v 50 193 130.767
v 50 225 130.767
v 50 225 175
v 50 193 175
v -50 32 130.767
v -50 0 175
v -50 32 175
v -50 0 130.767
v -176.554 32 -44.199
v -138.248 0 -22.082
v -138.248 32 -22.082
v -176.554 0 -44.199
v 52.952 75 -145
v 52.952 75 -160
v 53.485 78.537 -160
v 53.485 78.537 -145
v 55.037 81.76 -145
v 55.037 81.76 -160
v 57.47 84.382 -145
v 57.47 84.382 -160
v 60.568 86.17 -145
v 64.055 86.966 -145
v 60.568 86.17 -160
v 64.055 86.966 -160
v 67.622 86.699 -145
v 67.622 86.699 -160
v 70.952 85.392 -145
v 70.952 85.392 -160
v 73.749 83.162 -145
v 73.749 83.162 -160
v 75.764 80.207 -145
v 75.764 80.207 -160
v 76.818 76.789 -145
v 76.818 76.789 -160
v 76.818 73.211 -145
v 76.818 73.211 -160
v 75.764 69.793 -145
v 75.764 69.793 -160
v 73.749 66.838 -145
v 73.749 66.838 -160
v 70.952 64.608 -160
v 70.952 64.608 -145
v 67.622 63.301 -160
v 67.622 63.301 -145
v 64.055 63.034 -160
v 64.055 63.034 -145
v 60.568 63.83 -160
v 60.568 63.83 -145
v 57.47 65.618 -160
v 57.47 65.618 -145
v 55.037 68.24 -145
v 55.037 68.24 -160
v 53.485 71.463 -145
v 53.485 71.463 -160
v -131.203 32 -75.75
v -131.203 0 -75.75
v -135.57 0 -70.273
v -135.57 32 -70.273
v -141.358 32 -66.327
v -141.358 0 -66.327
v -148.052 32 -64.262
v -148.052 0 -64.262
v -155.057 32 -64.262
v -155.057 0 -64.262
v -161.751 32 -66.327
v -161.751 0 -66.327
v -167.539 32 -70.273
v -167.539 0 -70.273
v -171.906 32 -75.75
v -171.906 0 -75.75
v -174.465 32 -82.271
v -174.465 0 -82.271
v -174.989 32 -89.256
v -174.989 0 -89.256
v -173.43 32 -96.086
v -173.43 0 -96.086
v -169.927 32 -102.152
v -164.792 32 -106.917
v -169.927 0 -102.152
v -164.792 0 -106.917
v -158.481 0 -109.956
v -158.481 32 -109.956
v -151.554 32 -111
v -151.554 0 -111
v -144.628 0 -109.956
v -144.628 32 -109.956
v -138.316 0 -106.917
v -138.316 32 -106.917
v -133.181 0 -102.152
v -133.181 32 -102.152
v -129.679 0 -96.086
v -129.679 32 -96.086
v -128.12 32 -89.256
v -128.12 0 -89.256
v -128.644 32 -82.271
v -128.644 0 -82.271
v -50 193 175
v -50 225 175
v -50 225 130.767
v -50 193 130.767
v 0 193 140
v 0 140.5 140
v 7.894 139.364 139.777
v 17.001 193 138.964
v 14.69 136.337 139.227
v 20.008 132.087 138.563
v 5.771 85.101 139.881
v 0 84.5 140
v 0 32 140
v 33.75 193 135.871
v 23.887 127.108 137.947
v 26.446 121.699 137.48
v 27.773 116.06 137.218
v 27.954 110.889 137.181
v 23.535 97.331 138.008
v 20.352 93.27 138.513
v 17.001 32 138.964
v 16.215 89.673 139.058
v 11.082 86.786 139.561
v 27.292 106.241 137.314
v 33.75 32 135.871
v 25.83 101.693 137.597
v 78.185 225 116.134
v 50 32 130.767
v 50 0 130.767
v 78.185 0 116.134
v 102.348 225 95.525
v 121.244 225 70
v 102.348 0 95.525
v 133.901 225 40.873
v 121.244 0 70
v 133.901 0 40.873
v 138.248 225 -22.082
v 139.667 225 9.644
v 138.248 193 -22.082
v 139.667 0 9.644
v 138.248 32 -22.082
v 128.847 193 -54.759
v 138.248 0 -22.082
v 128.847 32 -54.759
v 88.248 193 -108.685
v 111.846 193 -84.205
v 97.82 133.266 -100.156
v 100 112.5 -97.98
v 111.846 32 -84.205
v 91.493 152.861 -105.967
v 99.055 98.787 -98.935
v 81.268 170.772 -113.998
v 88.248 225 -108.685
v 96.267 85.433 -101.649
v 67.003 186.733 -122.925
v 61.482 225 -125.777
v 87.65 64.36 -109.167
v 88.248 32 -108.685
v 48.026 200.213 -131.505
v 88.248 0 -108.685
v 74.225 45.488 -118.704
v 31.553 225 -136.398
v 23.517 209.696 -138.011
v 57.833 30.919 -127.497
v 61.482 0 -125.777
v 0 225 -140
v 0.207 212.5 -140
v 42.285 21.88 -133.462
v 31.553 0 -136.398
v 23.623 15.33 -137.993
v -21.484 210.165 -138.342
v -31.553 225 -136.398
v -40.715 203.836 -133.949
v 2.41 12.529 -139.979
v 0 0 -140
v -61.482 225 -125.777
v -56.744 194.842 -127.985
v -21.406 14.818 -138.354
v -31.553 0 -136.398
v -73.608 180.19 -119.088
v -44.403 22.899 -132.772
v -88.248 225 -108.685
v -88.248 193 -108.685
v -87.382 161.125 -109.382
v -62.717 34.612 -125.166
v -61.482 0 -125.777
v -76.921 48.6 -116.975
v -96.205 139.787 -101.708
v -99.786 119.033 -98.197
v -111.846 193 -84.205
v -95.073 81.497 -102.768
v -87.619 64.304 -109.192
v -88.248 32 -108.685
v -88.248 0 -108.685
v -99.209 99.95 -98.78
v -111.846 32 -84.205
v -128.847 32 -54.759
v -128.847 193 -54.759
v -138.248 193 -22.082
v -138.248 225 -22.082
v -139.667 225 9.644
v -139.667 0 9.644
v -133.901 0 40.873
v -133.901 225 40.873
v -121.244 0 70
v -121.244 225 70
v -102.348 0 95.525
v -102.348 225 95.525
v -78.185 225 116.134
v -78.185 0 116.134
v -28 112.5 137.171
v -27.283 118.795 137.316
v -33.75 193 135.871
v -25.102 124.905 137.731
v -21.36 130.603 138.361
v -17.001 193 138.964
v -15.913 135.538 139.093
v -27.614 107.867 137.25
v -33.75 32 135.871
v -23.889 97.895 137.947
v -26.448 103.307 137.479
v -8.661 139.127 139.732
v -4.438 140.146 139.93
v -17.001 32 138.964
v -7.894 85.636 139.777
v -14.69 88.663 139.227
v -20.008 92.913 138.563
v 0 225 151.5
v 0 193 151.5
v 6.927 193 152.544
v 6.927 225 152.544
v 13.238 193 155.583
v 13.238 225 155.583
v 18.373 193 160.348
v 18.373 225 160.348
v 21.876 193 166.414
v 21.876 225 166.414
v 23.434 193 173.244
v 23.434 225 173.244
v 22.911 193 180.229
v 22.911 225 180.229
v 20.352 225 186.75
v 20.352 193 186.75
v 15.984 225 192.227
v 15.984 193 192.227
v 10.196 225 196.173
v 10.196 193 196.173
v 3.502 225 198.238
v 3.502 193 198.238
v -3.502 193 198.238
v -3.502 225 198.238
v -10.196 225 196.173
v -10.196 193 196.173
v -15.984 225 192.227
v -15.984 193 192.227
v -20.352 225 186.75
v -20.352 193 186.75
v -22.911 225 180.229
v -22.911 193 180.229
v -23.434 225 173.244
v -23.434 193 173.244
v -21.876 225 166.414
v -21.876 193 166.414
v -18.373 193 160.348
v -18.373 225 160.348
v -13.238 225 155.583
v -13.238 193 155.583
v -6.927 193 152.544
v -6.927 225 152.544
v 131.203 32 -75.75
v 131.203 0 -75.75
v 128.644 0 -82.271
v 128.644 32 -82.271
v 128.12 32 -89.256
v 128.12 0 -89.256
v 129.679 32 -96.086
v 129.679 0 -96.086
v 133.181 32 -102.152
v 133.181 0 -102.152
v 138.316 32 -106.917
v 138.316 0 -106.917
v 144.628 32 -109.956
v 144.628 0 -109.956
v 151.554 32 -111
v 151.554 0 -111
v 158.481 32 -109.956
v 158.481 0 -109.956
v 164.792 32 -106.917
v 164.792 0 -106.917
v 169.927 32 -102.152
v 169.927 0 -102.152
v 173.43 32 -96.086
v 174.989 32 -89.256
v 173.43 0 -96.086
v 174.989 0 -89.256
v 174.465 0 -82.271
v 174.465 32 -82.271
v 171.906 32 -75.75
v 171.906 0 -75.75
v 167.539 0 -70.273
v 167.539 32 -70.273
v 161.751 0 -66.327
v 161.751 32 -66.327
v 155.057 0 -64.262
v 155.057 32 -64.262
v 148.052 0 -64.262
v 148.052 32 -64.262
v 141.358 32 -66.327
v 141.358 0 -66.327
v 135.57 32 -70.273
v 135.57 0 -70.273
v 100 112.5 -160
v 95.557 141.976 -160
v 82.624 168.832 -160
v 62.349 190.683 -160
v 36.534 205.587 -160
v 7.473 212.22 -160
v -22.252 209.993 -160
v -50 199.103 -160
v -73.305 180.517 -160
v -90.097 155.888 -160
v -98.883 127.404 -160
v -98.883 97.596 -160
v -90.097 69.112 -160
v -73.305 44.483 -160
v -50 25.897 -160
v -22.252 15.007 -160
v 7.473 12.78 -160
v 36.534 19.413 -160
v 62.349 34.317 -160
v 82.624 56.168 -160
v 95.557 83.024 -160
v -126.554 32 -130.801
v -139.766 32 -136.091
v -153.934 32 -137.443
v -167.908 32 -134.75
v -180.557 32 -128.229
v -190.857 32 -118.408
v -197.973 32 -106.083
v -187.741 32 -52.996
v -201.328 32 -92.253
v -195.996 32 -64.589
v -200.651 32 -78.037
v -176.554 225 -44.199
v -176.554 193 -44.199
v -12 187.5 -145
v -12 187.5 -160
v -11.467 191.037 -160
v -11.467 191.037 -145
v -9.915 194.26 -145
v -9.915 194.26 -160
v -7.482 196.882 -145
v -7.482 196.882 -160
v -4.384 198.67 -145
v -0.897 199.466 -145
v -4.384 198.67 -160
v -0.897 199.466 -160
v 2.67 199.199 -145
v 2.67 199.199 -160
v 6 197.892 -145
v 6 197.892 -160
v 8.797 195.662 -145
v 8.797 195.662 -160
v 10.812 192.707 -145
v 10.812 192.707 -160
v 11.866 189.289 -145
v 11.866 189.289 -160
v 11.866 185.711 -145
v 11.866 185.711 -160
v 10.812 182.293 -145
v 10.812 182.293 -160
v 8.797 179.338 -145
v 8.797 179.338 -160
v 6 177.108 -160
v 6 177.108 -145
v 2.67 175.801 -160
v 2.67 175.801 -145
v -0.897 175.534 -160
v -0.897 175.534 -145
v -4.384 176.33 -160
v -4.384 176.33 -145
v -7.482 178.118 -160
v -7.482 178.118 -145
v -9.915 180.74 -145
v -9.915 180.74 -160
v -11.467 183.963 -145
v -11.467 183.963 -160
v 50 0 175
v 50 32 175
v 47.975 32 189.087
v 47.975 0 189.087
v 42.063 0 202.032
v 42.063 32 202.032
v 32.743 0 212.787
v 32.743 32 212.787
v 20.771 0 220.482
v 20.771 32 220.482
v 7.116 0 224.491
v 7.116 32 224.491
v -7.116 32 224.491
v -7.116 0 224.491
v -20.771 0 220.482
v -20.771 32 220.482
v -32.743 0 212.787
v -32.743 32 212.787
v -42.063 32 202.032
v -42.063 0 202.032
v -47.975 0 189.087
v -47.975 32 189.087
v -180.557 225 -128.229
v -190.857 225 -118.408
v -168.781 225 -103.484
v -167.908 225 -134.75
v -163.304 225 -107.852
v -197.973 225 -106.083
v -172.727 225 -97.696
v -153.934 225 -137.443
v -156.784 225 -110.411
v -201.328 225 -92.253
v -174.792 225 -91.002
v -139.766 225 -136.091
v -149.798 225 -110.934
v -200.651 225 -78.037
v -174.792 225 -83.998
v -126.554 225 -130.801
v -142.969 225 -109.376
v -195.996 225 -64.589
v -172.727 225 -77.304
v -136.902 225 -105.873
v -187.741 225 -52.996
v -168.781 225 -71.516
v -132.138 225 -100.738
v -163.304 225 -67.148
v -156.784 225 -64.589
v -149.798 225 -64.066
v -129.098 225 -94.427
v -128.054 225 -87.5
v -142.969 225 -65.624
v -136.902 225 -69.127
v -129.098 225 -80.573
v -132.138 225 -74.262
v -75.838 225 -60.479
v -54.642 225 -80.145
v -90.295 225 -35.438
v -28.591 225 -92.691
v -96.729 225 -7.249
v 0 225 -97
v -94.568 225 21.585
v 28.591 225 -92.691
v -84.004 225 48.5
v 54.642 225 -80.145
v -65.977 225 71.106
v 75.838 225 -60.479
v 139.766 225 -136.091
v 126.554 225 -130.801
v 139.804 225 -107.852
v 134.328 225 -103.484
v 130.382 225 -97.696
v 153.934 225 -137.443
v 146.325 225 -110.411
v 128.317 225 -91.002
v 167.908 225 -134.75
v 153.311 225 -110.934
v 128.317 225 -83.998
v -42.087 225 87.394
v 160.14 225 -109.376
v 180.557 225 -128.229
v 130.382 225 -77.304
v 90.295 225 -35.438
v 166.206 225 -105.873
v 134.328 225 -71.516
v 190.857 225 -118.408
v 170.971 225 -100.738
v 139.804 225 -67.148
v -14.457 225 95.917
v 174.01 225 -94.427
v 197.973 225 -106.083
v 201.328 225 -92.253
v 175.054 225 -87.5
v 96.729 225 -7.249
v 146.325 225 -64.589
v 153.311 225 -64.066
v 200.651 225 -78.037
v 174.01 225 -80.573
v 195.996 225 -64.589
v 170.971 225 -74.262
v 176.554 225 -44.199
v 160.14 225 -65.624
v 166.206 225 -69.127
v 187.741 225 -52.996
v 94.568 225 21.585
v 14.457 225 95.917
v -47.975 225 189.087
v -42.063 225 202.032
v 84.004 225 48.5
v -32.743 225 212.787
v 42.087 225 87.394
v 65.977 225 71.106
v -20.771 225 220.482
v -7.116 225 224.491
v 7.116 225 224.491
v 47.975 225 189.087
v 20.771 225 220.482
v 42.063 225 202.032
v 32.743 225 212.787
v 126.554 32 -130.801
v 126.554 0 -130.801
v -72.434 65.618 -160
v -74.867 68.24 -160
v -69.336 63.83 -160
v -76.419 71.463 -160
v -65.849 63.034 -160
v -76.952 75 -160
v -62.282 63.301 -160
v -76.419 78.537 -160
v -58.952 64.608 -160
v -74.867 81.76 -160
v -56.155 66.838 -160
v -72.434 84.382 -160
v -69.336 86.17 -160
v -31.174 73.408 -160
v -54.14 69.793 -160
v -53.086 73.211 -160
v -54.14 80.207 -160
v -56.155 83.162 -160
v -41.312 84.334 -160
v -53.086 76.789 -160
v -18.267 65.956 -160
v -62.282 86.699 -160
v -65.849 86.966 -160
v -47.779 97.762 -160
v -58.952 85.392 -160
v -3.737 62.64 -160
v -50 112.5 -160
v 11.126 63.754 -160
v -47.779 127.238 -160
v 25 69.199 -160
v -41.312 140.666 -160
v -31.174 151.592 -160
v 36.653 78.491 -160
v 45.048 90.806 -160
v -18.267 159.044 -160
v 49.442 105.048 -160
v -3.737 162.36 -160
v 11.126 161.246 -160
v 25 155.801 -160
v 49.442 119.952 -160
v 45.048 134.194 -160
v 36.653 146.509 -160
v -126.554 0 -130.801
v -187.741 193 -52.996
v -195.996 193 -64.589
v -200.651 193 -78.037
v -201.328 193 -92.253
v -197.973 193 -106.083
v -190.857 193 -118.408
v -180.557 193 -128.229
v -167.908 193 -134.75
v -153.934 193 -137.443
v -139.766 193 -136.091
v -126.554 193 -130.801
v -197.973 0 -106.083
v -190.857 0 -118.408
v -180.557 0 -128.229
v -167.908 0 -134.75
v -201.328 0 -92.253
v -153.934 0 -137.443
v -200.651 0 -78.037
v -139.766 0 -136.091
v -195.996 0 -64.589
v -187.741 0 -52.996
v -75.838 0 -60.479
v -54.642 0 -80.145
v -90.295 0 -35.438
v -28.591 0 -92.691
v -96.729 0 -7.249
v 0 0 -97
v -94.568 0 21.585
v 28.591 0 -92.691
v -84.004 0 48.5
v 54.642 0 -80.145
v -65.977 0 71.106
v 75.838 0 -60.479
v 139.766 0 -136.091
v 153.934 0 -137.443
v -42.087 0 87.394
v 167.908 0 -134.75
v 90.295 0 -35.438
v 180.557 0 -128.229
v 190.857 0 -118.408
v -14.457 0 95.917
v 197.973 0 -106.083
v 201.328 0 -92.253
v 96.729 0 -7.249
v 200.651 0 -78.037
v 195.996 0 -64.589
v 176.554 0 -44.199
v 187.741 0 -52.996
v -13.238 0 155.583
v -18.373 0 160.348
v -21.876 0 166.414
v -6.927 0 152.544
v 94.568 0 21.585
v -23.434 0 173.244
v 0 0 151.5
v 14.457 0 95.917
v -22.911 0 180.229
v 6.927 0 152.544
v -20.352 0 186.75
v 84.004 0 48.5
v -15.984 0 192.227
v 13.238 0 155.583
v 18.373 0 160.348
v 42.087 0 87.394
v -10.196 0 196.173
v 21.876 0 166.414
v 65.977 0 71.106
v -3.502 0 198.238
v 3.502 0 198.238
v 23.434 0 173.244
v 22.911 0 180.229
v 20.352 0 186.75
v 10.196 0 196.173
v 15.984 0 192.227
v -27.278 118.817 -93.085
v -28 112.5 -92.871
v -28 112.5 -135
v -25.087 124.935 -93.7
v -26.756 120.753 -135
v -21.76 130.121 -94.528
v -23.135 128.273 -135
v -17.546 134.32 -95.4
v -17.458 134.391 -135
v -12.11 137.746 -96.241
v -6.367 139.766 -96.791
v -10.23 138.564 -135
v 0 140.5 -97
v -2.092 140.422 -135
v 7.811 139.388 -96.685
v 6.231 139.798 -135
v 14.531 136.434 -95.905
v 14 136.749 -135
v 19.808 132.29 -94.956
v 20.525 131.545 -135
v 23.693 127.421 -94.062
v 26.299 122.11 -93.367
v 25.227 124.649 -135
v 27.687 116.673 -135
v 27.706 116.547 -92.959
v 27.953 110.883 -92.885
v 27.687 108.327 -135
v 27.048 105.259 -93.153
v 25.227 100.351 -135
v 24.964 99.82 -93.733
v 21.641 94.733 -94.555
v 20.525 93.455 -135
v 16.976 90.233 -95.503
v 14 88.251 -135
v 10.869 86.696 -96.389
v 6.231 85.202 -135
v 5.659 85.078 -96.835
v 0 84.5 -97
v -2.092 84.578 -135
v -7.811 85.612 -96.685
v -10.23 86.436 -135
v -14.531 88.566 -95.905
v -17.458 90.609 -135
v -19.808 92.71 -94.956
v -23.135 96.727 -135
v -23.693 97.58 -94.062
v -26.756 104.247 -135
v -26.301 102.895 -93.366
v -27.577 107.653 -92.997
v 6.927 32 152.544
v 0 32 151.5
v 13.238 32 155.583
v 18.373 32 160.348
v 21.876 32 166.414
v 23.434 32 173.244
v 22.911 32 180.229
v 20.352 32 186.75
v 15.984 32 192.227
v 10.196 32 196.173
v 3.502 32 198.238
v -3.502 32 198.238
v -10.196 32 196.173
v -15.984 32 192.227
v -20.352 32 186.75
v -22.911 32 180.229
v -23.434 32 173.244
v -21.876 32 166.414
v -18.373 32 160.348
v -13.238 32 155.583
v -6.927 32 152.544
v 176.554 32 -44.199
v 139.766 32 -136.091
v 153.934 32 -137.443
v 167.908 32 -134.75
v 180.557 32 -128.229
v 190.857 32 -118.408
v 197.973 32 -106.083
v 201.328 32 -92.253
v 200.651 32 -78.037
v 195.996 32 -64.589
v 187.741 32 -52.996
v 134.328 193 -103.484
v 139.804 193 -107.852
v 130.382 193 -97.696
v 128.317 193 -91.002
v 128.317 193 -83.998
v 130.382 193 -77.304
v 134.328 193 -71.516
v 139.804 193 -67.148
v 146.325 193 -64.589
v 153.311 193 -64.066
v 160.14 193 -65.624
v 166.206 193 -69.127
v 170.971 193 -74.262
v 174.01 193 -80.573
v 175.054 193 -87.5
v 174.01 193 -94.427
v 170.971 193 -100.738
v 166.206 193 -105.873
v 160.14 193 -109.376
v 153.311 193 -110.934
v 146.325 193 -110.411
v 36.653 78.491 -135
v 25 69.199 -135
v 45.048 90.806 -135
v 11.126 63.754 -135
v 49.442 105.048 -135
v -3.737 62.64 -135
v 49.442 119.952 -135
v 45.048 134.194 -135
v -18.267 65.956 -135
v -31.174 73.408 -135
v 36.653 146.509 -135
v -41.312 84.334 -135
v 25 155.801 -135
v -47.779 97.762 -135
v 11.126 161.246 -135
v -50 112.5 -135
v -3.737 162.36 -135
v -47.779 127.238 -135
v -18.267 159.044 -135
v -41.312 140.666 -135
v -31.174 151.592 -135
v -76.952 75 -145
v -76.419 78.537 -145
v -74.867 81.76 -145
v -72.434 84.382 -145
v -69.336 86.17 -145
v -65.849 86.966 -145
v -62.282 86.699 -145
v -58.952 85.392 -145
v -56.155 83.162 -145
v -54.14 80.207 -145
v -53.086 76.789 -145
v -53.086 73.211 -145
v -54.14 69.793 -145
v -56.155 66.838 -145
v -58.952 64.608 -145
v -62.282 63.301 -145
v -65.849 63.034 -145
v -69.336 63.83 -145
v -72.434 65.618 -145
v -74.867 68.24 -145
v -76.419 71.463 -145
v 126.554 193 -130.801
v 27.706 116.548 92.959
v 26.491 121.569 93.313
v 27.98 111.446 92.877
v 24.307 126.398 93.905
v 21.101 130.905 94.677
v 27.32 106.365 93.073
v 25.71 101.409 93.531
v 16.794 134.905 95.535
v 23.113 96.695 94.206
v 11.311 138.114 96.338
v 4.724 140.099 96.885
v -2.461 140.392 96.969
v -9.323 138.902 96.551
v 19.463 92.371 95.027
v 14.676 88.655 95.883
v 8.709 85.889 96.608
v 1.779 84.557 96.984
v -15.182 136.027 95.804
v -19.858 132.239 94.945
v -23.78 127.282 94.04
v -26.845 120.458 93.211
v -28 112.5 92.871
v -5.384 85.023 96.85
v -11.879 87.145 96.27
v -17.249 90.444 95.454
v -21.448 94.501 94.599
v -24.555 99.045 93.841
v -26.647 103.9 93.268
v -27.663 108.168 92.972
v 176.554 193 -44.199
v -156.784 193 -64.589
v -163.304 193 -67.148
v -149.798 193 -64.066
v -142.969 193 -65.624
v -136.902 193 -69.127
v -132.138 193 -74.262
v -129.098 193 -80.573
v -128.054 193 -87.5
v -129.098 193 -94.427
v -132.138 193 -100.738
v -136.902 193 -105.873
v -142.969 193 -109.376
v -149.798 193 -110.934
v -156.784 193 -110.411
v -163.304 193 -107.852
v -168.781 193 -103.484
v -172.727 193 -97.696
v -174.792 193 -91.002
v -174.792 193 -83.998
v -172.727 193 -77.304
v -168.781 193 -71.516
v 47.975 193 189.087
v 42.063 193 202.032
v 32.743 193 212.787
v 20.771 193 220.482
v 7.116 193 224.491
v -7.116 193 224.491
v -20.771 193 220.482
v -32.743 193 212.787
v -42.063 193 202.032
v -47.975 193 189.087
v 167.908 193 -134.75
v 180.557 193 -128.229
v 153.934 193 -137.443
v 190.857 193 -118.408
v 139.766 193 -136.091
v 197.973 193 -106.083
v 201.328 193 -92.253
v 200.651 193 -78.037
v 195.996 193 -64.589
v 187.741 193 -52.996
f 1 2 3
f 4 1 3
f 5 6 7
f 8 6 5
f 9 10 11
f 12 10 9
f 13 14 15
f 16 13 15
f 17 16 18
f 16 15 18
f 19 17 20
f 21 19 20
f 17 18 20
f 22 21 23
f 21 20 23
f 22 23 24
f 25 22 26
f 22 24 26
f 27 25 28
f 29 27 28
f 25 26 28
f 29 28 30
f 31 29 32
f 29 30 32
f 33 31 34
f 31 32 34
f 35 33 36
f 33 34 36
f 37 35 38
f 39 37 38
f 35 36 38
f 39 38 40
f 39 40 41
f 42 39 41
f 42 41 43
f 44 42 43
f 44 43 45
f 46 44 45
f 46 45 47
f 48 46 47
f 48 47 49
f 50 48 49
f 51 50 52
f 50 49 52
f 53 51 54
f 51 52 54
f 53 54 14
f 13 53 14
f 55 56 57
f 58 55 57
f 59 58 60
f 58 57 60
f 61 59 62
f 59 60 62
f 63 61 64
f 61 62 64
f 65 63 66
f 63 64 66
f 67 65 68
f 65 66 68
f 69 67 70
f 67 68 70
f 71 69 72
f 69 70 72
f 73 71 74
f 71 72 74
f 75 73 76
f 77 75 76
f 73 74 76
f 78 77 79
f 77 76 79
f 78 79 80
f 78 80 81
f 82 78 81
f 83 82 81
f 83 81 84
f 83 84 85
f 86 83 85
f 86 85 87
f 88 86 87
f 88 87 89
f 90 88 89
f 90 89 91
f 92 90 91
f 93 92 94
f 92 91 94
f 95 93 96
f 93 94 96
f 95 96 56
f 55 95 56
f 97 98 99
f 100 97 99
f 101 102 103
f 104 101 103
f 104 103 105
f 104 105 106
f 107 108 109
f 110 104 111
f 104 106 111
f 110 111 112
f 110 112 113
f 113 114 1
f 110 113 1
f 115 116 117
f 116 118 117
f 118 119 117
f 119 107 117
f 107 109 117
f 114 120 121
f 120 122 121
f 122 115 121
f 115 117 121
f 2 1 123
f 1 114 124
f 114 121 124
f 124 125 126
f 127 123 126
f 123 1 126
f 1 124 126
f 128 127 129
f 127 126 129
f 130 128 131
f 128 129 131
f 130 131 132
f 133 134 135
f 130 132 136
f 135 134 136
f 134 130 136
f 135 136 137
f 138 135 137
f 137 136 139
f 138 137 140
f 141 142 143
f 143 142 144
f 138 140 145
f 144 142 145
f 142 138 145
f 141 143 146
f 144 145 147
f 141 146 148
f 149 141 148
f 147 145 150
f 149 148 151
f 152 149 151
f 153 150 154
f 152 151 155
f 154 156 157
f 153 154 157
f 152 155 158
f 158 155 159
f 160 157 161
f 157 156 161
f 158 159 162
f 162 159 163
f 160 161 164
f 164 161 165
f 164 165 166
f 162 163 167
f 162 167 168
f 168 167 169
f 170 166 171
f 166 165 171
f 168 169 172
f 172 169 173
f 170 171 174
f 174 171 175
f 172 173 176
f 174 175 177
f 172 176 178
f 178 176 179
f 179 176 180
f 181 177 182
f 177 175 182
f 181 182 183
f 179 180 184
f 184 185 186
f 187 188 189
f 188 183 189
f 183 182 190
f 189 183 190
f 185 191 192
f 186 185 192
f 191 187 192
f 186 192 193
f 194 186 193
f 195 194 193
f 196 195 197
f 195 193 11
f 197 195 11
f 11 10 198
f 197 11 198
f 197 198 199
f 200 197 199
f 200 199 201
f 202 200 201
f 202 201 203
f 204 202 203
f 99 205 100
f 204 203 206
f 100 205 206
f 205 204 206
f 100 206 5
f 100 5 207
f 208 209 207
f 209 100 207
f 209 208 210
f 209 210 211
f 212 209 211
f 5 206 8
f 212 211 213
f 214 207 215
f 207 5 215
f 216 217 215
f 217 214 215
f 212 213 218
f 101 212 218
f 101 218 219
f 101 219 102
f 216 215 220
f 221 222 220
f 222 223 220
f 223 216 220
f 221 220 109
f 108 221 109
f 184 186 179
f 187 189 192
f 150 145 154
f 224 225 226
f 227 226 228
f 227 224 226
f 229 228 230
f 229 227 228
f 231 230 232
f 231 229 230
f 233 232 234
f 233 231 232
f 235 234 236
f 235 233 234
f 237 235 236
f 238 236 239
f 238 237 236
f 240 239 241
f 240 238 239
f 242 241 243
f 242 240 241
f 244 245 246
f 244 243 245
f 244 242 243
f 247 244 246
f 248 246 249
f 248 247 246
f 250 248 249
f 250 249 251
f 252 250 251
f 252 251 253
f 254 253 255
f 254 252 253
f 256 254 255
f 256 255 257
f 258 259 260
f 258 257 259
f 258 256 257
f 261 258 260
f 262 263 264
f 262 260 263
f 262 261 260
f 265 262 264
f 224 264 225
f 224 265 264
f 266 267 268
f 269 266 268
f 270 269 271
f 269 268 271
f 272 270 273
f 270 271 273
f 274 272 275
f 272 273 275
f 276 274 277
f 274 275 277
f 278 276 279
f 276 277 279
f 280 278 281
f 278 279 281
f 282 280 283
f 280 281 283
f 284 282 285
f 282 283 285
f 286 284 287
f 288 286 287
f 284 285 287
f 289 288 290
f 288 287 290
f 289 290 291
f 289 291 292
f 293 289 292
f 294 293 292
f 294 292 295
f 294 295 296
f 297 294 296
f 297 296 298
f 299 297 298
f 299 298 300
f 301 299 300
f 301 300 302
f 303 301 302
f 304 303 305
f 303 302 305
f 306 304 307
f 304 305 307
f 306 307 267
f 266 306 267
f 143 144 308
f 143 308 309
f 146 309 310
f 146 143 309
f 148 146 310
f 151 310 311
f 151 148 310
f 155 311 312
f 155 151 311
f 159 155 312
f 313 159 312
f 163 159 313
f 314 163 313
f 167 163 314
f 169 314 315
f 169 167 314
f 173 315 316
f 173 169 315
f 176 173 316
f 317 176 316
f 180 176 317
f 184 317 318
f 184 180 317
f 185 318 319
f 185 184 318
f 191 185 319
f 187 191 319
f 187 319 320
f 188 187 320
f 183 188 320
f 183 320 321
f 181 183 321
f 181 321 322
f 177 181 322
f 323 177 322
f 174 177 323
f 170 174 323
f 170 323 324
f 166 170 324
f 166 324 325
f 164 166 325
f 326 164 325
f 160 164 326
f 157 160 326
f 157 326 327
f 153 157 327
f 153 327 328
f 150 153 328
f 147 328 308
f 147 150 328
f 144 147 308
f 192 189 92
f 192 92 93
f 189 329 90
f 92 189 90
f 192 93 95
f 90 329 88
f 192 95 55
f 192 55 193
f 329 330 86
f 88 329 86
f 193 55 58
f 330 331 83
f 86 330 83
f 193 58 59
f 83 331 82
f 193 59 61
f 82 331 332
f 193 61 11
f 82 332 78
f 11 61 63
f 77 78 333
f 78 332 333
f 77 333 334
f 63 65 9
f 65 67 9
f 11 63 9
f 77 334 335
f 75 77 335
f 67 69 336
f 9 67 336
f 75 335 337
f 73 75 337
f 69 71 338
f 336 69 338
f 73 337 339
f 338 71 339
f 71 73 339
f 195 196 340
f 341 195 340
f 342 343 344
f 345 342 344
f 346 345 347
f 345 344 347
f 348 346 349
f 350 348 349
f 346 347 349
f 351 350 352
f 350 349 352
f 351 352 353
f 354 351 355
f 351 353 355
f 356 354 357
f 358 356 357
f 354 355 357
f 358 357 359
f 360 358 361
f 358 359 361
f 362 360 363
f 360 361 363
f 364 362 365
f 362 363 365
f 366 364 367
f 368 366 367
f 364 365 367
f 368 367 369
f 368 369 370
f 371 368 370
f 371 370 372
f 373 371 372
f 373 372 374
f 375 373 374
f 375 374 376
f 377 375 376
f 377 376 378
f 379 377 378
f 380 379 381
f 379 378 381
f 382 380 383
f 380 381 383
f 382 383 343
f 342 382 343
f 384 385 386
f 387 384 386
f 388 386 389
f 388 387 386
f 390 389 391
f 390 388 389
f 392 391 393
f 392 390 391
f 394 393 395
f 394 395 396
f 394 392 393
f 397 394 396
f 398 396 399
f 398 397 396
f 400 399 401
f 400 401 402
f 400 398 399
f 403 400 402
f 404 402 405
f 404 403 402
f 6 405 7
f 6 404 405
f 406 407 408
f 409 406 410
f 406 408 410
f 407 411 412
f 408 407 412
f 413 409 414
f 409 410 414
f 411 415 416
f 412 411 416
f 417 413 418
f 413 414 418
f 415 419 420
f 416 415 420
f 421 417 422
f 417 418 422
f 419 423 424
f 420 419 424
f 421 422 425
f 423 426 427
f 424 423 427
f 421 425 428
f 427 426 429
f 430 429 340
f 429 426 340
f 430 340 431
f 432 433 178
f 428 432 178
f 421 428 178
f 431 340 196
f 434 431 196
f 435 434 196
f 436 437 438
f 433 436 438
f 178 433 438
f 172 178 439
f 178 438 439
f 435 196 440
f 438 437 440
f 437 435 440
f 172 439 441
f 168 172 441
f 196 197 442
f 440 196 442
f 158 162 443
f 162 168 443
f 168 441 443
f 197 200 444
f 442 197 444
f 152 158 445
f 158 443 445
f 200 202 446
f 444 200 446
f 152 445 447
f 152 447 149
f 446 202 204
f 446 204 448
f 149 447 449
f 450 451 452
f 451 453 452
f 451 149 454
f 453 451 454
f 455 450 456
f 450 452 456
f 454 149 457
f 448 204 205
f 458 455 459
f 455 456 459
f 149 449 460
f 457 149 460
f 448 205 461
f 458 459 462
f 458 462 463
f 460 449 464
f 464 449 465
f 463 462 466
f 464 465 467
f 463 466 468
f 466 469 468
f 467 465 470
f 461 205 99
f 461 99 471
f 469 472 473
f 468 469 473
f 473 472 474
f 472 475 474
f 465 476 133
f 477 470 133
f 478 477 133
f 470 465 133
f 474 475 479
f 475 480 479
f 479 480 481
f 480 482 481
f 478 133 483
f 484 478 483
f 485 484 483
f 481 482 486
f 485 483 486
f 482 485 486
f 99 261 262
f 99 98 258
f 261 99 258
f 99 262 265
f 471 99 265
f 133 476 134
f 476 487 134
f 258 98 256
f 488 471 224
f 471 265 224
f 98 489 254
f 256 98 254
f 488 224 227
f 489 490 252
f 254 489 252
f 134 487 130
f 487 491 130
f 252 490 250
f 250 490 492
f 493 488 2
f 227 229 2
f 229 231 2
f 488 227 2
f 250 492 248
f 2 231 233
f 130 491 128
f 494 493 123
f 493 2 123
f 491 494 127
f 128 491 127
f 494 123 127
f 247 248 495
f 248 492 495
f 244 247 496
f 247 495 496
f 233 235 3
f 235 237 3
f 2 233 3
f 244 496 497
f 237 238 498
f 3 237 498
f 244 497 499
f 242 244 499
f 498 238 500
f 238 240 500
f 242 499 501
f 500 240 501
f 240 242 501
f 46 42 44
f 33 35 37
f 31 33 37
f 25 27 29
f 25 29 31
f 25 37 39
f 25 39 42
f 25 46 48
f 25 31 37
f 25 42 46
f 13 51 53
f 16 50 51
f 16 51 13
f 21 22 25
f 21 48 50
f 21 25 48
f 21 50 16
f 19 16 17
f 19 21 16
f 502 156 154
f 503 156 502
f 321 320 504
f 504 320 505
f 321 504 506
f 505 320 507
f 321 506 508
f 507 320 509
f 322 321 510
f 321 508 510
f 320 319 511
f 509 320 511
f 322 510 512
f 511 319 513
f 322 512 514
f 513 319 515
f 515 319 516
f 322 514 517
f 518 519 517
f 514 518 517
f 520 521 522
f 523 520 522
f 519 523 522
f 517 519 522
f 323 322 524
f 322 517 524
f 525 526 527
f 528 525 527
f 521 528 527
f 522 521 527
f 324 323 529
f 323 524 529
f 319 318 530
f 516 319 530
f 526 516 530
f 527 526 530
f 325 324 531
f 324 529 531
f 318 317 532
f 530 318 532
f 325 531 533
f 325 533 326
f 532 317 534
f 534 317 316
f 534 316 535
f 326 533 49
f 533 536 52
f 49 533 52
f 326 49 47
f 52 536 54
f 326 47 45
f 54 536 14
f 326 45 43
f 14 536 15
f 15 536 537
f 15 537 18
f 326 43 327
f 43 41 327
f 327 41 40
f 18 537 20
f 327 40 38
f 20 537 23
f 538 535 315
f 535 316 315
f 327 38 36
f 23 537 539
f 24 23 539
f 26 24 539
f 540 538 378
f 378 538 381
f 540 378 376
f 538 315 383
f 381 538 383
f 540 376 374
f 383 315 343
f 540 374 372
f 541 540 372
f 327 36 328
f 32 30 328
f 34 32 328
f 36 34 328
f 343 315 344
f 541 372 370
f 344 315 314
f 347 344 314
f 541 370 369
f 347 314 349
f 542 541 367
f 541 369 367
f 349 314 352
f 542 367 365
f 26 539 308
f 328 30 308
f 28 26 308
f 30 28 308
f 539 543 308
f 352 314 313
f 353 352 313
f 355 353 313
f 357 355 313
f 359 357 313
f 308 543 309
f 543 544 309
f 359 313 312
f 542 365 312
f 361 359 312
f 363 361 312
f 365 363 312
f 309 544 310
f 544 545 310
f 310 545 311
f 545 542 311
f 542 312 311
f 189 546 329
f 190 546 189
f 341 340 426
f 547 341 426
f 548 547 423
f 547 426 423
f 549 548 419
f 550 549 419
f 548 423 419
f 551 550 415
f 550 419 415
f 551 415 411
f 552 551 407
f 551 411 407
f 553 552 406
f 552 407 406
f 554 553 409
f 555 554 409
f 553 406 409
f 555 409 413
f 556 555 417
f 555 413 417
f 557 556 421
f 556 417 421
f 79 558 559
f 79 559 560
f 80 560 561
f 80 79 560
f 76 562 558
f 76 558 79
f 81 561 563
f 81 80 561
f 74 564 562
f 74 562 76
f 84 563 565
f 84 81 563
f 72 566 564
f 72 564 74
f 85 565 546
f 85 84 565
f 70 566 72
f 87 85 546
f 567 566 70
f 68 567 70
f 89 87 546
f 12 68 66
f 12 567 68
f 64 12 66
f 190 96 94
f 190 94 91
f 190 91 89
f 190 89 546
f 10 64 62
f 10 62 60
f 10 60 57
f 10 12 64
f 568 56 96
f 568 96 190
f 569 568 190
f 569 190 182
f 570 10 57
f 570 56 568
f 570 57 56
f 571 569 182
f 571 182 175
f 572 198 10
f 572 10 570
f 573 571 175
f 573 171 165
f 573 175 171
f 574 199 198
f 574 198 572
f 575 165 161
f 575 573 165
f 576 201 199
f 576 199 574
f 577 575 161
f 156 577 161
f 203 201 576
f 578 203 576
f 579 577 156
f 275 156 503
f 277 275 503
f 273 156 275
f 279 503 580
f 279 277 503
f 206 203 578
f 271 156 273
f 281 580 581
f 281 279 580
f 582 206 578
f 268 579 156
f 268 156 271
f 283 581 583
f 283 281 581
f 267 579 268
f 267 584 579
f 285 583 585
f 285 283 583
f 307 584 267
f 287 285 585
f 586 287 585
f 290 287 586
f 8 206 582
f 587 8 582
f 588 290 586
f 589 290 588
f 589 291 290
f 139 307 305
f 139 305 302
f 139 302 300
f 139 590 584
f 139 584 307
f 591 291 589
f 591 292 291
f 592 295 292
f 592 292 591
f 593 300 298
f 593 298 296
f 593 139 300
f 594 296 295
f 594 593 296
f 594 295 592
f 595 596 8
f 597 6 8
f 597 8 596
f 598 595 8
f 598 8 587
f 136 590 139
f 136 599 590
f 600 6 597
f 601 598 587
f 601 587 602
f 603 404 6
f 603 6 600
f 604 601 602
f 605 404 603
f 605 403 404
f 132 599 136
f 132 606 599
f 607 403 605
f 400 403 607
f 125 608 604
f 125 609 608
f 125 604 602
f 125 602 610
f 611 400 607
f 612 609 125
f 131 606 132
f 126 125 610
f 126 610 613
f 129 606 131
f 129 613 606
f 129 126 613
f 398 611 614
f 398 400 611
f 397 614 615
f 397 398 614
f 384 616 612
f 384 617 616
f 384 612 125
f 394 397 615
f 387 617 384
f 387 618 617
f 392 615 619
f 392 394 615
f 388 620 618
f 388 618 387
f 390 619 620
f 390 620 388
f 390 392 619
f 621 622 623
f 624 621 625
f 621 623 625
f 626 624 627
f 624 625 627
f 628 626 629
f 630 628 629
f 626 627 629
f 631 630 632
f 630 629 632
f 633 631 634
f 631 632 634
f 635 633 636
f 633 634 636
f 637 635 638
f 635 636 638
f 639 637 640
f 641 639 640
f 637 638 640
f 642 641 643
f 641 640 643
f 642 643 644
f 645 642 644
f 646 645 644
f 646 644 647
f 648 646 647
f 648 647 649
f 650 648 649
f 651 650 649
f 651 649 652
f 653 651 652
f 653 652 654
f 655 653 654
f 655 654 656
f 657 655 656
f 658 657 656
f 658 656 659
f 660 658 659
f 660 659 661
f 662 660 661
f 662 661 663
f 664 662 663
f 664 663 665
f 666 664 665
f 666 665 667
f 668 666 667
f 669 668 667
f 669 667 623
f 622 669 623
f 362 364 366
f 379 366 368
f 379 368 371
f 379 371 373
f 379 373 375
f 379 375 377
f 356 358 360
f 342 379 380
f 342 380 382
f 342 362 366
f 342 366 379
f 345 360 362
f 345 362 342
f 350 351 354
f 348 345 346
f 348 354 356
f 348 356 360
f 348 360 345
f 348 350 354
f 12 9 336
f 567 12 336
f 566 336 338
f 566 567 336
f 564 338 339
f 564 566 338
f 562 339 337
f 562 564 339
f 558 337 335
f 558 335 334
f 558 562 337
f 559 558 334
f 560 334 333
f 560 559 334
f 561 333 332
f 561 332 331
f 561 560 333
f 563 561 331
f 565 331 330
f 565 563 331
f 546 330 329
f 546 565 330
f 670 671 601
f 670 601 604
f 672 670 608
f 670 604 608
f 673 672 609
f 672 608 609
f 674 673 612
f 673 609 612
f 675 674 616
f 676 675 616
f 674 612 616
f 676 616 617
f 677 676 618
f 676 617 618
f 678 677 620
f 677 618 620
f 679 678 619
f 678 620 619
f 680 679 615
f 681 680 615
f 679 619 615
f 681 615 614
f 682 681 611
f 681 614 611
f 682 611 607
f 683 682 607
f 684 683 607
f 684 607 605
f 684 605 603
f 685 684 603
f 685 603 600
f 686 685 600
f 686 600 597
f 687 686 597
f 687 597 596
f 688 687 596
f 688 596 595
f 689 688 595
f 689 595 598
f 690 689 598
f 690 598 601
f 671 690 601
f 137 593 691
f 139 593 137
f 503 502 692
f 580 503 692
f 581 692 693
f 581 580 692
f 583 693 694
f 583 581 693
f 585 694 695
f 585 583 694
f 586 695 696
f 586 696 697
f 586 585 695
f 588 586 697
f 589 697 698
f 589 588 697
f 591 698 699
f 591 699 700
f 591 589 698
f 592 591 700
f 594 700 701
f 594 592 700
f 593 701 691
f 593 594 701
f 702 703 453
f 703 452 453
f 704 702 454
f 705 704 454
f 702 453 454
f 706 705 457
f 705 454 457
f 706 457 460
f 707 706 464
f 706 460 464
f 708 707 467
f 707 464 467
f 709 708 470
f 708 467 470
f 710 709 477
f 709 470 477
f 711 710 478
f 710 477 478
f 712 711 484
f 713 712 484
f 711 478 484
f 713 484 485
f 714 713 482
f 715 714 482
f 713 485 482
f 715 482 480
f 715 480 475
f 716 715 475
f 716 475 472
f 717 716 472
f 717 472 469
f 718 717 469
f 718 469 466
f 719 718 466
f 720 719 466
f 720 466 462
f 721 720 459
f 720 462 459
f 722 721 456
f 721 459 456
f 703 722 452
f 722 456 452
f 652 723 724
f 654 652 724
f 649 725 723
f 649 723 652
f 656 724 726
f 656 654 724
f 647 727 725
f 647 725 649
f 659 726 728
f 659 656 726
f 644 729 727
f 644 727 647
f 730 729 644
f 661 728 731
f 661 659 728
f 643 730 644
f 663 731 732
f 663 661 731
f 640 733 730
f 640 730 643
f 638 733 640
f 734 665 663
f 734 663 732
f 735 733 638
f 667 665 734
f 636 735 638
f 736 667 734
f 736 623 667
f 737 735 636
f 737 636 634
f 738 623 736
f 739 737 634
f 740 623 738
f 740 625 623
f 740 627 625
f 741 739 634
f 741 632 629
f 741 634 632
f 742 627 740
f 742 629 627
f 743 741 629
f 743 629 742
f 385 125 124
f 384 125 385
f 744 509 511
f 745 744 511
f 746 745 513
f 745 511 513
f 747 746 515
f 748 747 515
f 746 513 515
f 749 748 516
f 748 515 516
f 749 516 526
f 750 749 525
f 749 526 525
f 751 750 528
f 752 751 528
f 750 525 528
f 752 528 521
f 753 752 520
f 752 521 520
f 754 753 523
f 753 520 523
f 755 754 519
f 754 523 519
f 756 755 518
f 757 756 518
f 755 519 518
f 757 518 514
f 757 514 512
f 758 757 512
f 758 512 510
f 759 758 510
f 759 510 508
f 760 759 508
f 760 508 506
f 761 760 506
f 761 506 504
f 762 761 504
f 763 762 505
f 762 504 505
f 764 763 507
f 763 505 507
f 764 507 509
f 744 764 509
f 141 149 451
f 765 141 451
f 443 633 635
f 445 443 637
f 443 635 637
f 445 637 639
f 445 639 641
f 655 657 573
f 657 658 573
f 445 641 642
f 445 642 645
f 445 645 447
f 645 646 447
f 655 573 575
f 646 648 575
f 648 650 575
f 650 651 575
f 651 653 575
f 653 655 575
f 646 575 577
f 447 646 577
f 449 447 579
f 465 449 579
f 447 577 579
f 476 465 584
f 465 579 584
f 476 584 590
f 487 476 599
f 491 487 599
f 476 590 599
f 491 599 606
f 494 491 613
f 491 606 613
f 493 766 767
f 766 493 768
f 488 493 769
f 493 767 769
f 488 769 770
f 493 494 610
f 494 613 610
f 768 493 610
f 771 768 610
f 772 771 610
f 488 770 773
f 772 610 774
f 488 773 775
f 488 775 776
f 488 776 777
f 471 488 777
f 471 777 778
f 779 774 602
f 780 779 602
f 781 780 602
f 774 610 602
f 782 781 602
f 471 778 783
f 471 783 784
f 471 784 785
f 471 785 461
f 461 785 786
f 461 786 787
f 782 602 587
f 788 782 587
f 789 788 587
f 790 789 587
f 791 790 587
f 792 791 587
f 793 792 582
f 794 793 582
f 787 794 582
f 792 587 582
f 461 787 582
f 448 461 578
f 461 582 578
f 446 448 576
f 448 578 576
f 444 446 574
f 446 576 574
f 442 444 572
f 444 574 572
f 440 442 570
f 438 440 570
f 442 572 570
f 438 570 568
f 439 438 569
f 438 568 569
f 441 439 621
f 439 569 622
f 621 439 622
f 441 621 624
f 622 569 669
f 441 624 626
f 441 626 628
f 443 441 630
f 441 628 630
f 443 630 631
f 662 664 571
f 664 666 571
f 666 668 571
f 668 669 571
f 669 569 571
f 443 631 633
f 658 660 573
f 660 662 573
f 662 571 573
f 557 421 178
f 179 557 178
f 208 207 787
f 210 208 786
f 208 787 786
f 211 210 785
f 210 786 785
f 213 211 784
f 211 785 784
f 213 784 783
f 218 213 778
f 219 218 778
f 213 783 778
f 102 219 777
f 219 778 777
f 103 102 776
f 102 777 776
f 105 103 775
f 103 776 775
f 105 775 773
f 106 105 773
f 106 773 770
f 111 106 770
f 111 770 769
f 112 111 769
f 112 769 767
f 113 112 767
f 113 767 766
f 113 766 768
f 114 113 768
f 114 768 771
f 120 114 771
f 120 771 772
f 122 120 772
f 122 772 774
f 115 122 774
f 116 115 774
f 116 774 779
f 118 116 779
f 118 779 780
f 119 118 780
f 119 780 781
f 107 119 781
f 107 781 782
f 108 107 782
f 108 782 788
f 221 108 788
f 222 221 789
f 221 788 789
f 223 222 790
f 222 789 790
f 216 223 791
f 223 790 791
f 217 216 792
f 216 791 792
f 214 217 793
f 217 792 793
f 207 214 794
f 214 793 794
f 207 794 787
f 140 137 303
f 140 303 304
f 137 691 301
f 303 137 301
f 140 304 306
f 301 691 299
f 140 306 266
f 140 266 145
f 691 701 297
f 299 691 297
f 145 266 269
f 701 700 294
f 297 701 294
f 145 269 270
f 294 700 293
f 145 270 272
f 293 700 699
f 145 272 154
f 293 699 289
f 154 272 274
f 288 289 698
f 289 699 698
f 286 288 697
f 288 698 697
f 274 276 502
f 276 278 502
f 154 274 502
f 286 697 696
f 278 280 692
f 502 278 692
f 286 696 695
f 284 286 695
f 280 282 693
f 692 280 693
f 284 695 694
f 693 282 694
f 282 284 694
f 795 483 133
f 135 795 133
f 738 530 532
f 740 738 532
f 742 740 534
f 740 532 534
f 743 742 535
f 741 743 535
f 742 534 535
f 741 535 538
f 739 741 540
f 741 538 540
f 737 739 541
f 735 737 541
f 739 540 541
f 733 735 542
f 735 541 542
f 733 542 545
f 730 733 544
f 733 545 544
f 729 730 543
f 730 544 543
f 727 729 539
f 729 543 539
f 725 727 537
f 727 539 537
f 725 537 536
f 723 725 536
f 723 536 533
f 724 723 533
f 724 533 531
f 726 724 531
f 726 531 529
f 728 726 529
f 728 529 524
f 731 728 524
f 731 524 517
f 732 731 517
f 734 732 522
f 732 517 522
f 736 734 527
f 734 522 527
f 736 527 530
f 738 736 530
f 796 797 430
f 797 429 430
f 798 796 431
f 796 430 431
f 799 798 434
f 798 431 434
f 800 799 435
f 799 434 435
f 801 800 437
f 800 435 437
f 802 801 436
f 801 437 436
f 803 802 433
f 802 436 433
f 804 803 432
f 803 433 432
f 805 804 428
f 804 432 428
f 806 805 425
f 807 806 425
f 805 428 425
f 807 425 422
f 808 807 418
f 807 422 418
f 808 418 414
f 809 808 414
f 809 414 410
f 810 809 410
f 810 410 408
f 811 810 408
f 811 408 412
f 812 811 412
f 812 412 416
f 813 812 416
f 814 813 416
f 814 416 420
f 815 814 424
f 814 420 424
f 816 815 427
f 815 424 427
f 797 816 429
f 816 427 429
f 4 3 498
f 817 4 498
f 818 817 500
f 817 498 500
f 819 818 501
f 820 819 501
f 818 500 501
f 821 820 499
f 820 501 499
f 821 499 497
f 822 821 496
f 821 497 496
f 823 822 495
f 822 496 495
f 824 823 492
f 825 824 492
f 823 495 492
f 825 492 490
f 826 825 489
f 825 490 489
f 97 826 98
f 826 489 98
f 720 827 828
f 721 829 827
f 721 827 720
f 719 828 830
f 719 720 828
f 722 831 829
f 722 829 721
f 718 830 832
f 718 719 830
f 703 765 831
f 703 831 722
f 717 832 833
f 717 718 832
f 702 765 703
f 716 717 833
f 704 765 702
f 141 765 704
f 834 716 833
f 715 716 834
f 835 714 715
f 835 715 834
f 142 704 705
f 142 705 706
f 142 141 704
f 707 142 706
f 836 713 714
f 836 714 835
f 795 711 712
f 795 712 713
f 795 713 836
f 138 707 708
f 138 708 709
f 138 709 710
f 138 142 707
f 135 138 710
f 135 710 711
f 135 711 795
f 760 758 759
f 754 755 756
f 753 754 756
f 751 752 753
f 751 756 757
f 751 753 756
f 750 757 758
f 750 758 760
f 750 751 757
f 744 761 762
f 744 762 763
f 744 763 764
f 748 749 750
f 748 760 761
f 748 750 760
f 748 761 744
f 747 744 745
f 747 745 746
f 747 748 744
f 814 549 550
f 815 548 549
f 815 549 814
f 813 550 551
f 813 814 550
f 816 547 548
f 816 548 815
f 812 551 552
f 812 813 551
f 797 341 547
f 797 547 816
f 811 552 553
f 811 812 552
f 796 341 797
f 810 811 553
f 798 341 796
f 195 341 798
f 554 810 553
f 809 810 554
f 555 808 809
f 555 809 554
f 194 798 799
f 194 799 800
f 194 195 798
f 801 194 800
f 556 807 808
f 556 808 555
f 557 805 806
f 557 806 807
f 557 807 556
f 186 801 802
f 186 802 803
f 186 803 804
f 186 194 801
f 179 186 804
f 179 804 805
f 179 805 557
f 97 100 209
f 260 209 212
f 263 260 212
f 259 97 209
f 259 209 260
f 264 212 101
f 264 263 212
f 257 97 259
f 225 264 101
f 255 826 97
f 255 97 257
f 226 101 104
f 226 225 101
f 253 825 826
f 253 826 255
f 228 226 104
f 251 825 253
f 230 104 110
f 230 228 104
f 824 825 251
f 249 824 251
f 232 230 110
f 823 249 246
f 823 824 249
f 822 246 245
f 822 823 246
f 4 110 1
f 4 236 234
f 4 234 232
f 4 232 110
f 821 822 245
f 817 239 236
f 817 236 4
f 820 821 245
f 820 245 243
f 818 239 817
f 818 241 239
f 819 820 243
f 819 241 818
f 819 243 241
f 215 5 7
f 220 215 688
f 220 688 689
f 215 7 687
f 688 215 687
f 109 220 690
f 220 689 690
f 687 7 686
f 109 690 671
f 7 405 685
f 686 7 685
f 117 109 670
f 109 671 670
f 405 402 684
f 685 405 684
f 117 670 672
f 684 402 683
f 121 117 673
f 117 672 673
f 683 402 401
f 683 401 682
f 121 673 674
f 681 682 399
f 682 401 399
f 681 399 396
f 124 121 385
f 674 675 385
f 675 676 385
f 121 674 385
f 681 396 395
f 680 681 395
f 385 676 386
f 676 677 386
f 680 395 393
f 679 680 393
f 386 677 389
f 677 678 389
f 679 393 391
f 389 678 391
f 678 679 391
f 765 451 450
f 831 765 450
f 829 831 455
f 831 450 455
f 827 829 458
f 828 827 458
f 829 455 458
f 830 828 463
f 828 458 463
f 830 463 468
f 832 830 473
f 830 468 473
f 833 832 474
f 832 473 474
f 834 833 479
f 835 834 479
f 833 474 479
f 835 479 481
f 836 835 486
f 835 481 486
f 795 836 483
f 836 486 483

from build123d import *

# Parameters (mm, degrees)
SKETCH3_R               = 140
BOSS_EXTRUDE1_DEPTH     = 225
SKETCH4_R               = 97
CUT_EXTRUDE1_DEPTH      = 300.708191413
BOSS_EXTRUDE3_DEPTH     = 32
SKETCH11_R              = 23.5
CUT_EXTRUDE3_DEPTH      = 348.634865915
CIRPATTERN15_COUNT      = 3
MIRROR6_COPY_1_DEPTH    = 32
MIRROR6_COPY_2_DEPTH    = 32
MIRROR6_COPY_3_SKETCH_R = 23.5
MIRROR6_COPY_3_DEPTH    = 348.634865915
MIRROR6_COPY_4_SKETCH_R = 23.5
MIRROR6_COPY_4_DEPTH    = 348.634865915
SKETCH16_R              = 100
BOSS_EXTRUDE4_DEPTH     = 160
SKETCH17_R              = 50
CUT_EXTRUDE4_DEPTH      = 25
SKETCH18_R              = 28
CUT_EXTRUDE5_DEPTH      = 470.945948606
SKETCH19_R              = 12
CUT_EXTRUDE6_DEPTH      = 15
SKETCH20_R              = 97
CUT_EXTRUDE7_DEPTH      = 377.661910221


with BuildPart() as part:
    # Sketch3 → Boss-Extrude1 (new body)
    with BuildSketch(Plane(origin=(0, 0, 0), x_dir=(1, 0, 0), z_dir=(0, 1, 0))):
        with Locations(Location((0, 0, 0), (0, 0, 270))):
            Circle(SKETCH3_R)
    extrude(amount=BOSS_EXTRUDE1_DEPTH)

    # Sketch4 → Cut-Extrude1 (cut, through all)
    with BuildSketch(Plane.XZ):
        with Locations(Location((0, 0, 0), (0, 0, 270))):
            Circle(SKETCH4_R)
    extrude(amount=-CUT_EXTRUDE1_DEPTH, mode=Mode.SUBTRACT)

    # Sketch10 → Boss-Extrude3 (add)
    with BuildSketch(Plane.XZ):
        with BuildLine():
            Line((-50, 175), (-50, 130.766968306))
            ThreePointArc((-50, 130.766968306), (0, 140), (50, 130.766968306))
            Line((50, 130.766968306), (50, 175))
            ThreePointArc((50, 175), (0, 225), (-50, 175))
        make_face()
    boss_extrude3 = extrude(amount=-BOSS_EXTRUDE3_DEPTH)

    # Sketch11 → Cut-Extrude3 (cut, through all)
    with BuildSketch(Plane.XZ):
        with Locations(Location((0, 175, 0), (0, 0, 270))):
            Circle(SKETCH11_R)
    cut_extrude3 = extrude(amount=-CUT_EXTRUDE3_DEPTH, mode=Mode.SUBTRACT)

    # CirPattern15: Boss-Extrude3, Cut-Extrude3 ×3 about axis
    cirpattern15_axis = Axis((0, 0, 0), (0, 1, 0))
    add([boss_extrude3.rotate(cirpattern15_axis, i * 360 / CIRPATTERN15_COUNT) for i in range(1, CIRPATTERN15_COUNT)])
    add([cut_extrude3.rotate(cirpattern15_axis, i * 360 / CIRPATTERN15_COUNT) for i in range(1, CIRPATTERN15_COUNT)], mode=Mode.SUBTRACT)

    # Mirror6: Boss-Extrude3, Cut-Extrude3 across plane
    add(boss_extrude3.mirror(Plane.ZX.offset(112.5)))
    add(cut_extrude3.mirror(Plane.ZX.offset(112.5)), mode=Mode.SUBTRACT)

    # Mirror6 copy 1 sketch → Mirror6 copy 1 (add)
    with BuildSketch(Plane(origin=(0, 225, 0), x_dir=(-0.4999999999999998, 0, -0.8660254037844387), z_dir=(0, 1, 0))):
        with BuildLine():
            Line((-50, -175), (-50, -130.766968306))
            ThreePointArc((-50, -130.766968306), (0, -140), (50, -130.766968306))
            Line((50, -130.766968306), (50, -175))
            ThreePointArc((50, -175), (0, -225), (-50, -175))
        make_face()
    extrude(amount=-MIRROR6_COPY_1_DEPTH)

    # Mirror6 copy 2 sketch → Mirror6 copy 2 (add)
    with BuildSketch(Plane(origin=(0, 225, 0), x_dir=(-0.5000000000000004, 0, 0.8660254037844384), z_dir=(0, 1, 0))):
        with BuildLine():
            Line((-50, -175), (-50, -130.766968306))
            ThreePointArc((-50, -130.766968306), (0, -140), (50, -130.766968306))
            Line((50, -130.766968306), (50, -175))
            ThreePointArc((50, -175), (0, -225), (-50, -175))
        make_face()
    extrude(amount=-MIRROR6_COPY_2_DEPTH)

    # Mirror6 copy 3 sketch → Mirror6 copy 3 (cut, through all)
    with BuildSketch(Plane(origin=(0, 225, 0), x_dir=(-0.4999999999999998, 0, -0.8660254037844387), z_dir=(0, 1, 0))):
        with Locations((0, -175)):
            Circle(MIRROR6_COPY_3_SKETCH_R)
    extrude(amount=-MIRROR6_COPY_3_DEPTH, mode=Mode.SUBTRACT)

    # Mirror6 copy 4 sketch → Mirror6 copy 4 (cut, through all)
    with BuildSketch(Plane(origin=(0, 225, 0), x_dir=(-0.5000000000000004, 0, 0.8660254037844384), z_dir=(0, 1, 0))):
        with Locations((0, -175)):
            Circle(MIRROR6_COPY_4_SKETCH_R)
    extrude(amount=-MIRROR6_COPY_4_DEPTH, mode=Mode.SUBTRACT)

    # Sketch16 → Boss-Extrude4 (add)
    with BuildSketch(Plane.XY):
        with Locations((0, 112.5)):
            Circle(SKETCH16_R)
    extrude(amount=-BOSS_EXTRUDE4_DEPTH)

    # Sketch17 → Cut-Extrude4 (cut)
    with BuildSketch(Plane(origin=(0, 0, -160), x_dir=(-1, 0, 0), z_dir=(0, 0, -1))):
        with Locations((0, 112.5)):
            Circle(SKETCH17_R)
    extrude(amount=-CUT_EXTRUDE4_DEPTH, mode=Mode.SUBTRACT)

    # Sketch18 → Cut-Extrude5 (cut, through all)
    with BuildSketch(Plane(origin=(0, 0, -135), x_dir=(-1, 0, 0), z_dir=(0, 0, -1))):
        with Locations((0, 112.5)):
            Circle(SKETCH18_R)
    extrude(amount=-CUT_EXTRUDE5_DEPTH, mode=Mode.SUBTRACT)

    # Sketch19 → Cut-Extrude6 (cut)
    with BuildSketch(Plane(origin=(0, 0, -160), x_dir=(-1, 0, 0), z_dir=(0, 0, -1))):
        with Locations((0, 187.5)):
            Circle(SKETCH19_R)
        with Locations((64.951905284, 75)):
            Circle(SKETCH19_R)
        with Locations((-64.951905284, 75)):
            Circle(SKETCH19_R)
    extrude(amount=-CUT_EXTRUDE6_DEPTH, mode=Mode.SUBTRACT)

    # Sketch20 → Cut-Extrude7 (cut, through all)
    with BuildSketch(Plane.XZ):
        with Locations(Location((0, 0, 0), (0, 0, 270))):
            Circle(SKETCH20_R)
    extrude(amount=-CUT_EXTRUDE7_DEPTH, mode=Mode.SUBTRACT)


solid = part.part
